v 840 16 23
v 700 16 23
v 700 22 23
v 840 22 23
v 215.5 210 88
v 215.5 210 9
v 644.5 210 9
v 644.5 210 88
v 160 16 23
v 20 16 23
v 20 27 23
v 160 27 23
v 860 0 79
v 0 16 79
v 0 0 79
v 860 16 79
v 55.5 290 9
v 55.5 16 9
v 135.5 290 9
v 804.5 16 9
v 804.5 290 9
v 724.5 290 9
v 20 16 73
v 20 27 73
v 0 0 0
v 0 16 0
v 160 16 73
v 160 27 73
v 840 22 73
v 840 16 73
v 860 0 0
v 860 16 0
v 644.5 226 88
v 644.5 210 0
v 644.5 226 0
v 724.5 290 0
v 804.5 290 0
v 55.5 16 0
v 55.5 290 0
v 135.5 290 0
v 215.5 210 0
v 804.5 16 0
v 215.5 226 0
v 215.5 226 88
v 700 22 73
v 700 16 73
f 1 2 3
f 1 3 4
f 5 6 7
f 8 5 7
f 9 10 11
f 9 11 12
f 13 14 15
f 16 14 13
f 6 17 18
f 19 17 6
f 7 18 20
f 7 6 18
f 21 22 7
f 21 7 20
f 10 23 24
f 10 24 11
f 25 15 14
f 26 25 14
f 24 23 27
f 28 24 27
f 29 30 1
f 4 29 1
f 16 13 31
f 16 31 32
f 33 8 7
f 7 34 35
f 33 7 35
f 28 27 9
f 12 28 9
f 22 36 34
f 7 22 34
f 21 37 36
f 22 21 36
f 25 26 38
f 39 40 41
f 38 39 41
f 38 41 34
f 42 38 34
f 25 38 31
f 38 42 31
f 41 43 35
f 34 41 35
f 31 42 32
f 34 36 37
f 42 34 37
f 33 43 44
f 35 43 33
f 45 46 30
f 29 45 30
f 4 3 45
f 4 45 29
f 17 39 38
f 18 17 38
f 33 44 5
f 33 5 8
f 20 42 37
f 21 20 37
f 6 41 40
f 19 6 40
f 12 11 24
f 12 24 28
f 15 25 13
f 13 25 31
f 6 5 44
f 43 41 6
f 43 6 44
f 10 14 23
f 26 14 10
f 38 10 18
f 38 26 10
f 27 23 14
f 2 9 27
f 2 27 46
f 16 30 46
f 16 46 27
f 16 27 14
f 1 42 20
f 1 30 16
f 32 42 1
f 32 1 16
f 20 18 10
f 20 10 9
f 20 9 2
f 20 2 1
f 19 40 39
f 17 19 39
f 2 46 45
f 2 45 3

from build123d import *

# Parameters (mm, degrees)
EXTRUDE_2_DEPTH = 9
SKETCH_3_W      = 860
SKETCH_3_H      = 16
EXTRUDE_3_DEPTH = 70
SKETCH_4_W      = 140
SKETCH_4_H      = 50
EXTRUDE_5_DEPTH = 11
SKETCH_6_W      = 140
SKETCH_6_H      = 50
EXTRUDE_6_DEPTH = 6
SKETCH_10_W     = 429
SKETCH_10_H     = 16
EXTRUDE_8_DEPTH = 79


with BuildPart() as part:
    # 草图1 → 凸台-拉伸2 (new body)
    with BuildSketch(Plane.XY):
        Polygon((0, 0), (860, 0), (860, 16), (804.5, 16), (804.5, 290), (724.5, 290), (644.5, 210), (644.5, 226), (215.5, 226), (215.5, 210), (135.5, 290), (55.5, 290), (55.5, 16), (0, 16), align=None)
    extrude(amount=EXTRUDE_2_DEPTH)

    # 草图3 → 凸台-拉伸3 (add)
    with BuildSketch(Plane.XY.offset(9)):
        with Locations((430, 8)):
            Rectangle(SKETCH_3_W, SKETCH_3_H)
    extrude(amount=EXTRUDE_3_DEPTH)

    # 草图4 → 凸台-拉伸5 (add)
    with BuildSketch(Plane(origin=(0, 16, 0), x_dir=(1, 0, 0), z_dir=(0, 1, 0))):
        with Locations((90, -48)):
            Rectangle(SKETCH_4_W, SKETCH_4_H)
    extrude(amount=EXTRUDE_5_DEPTH)

    # 草图6 → 凸台-拉伸6 (add)
    with BuildSketch(Plane(origin=(0, 16, 0), x_dir=(1, 0, 0), z_dir=(0, 1, 0))):
        with Locations((770, -48)):
            Rectangle(SKETCH_6_W, SKETCH_6_H)
    extrude(amount=EXTRUDE_6_DEPTH)

    # 草图10 → 凸台-拉伸8 (add)
    with BuildSketch(Plane.XY.offset(9)):
        with Locations((430, 218)):
            Rectangle(SKETCH_10_W, SKETCH_10_H)
    extrude(amount=EXTRUDE_8_DEPTH)


solid = part.part
